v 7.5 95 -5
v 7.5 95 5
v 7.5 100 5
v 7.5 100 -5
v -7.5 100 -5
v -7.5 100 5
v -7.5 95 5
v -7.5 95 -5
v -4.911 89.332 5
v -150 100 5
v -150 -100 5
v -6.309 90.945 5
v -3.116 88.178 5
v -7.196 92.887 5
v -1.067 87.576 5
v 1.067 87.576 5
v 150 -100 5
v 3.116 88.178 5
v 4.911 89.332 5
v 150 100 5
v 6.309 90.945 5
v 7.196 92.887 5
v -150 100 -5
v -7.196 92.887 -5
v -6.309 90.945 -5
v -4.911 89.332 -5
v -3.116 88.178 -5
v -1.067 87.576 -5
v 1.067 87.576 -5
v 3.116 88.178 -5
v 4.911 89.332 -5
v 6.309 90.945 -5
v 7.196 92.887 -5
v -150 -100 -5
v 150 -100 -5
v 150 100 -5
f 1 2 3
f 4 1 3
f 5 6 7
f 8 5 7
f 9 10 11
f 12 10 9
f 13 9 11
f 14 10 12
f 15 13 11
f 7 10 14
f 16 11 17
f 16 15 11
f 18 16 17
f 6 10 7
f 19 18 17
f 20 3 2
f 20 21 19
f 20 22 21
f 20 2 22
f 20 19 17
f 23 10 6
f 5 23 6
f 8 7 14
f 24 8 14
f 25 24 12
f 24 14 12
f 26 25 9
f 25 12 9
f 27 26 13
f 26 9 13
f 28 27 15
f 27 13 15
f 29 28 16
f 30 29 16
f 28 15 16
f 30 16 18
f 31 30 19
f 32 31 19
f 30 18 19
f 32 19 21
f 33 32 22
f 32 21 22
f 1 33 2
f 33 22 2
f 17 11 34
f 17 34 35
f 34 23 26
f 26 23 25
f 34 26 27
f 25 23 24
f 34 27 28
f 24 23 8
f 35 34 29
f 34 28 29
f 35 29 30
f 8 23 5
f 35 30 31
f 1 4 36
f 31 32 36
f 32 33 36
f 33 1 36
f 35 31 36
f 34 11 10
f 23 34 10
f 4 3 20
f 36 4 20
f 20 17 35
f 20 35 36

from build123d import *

# Parameters (mm, degrees)
F0_W     = 300
F0_H     = 200
F1_DEPTH = 5
F3_DEPTH = 10


with BuildPart() as f1:
    # F0 (on Top) → F1 (new body, symmetric)
    with BuildSketch(Plane.XY):
        Rectangle(F0_W, F0_H)
    extrude(amount=F1_DEPTH, both=True)

    # F2 (on face) → F3 (cut)
    with BuildSketch(Plane.XY.offset(5)):
        with BuildLine():
            Line((-7.5, 100), (-7.5, 95))
            ThreePointArc((-7.5, 95), (0, 87.5), (7.5, 95))
            Line((7.5, 95), (7.5, 100))
            Line((7.5, 100), (-7.5, 100))
        make_face()
    extrude(amount=-F3_DEPTH, mode=Mode.SUBTRACT)


solid = f1.part
